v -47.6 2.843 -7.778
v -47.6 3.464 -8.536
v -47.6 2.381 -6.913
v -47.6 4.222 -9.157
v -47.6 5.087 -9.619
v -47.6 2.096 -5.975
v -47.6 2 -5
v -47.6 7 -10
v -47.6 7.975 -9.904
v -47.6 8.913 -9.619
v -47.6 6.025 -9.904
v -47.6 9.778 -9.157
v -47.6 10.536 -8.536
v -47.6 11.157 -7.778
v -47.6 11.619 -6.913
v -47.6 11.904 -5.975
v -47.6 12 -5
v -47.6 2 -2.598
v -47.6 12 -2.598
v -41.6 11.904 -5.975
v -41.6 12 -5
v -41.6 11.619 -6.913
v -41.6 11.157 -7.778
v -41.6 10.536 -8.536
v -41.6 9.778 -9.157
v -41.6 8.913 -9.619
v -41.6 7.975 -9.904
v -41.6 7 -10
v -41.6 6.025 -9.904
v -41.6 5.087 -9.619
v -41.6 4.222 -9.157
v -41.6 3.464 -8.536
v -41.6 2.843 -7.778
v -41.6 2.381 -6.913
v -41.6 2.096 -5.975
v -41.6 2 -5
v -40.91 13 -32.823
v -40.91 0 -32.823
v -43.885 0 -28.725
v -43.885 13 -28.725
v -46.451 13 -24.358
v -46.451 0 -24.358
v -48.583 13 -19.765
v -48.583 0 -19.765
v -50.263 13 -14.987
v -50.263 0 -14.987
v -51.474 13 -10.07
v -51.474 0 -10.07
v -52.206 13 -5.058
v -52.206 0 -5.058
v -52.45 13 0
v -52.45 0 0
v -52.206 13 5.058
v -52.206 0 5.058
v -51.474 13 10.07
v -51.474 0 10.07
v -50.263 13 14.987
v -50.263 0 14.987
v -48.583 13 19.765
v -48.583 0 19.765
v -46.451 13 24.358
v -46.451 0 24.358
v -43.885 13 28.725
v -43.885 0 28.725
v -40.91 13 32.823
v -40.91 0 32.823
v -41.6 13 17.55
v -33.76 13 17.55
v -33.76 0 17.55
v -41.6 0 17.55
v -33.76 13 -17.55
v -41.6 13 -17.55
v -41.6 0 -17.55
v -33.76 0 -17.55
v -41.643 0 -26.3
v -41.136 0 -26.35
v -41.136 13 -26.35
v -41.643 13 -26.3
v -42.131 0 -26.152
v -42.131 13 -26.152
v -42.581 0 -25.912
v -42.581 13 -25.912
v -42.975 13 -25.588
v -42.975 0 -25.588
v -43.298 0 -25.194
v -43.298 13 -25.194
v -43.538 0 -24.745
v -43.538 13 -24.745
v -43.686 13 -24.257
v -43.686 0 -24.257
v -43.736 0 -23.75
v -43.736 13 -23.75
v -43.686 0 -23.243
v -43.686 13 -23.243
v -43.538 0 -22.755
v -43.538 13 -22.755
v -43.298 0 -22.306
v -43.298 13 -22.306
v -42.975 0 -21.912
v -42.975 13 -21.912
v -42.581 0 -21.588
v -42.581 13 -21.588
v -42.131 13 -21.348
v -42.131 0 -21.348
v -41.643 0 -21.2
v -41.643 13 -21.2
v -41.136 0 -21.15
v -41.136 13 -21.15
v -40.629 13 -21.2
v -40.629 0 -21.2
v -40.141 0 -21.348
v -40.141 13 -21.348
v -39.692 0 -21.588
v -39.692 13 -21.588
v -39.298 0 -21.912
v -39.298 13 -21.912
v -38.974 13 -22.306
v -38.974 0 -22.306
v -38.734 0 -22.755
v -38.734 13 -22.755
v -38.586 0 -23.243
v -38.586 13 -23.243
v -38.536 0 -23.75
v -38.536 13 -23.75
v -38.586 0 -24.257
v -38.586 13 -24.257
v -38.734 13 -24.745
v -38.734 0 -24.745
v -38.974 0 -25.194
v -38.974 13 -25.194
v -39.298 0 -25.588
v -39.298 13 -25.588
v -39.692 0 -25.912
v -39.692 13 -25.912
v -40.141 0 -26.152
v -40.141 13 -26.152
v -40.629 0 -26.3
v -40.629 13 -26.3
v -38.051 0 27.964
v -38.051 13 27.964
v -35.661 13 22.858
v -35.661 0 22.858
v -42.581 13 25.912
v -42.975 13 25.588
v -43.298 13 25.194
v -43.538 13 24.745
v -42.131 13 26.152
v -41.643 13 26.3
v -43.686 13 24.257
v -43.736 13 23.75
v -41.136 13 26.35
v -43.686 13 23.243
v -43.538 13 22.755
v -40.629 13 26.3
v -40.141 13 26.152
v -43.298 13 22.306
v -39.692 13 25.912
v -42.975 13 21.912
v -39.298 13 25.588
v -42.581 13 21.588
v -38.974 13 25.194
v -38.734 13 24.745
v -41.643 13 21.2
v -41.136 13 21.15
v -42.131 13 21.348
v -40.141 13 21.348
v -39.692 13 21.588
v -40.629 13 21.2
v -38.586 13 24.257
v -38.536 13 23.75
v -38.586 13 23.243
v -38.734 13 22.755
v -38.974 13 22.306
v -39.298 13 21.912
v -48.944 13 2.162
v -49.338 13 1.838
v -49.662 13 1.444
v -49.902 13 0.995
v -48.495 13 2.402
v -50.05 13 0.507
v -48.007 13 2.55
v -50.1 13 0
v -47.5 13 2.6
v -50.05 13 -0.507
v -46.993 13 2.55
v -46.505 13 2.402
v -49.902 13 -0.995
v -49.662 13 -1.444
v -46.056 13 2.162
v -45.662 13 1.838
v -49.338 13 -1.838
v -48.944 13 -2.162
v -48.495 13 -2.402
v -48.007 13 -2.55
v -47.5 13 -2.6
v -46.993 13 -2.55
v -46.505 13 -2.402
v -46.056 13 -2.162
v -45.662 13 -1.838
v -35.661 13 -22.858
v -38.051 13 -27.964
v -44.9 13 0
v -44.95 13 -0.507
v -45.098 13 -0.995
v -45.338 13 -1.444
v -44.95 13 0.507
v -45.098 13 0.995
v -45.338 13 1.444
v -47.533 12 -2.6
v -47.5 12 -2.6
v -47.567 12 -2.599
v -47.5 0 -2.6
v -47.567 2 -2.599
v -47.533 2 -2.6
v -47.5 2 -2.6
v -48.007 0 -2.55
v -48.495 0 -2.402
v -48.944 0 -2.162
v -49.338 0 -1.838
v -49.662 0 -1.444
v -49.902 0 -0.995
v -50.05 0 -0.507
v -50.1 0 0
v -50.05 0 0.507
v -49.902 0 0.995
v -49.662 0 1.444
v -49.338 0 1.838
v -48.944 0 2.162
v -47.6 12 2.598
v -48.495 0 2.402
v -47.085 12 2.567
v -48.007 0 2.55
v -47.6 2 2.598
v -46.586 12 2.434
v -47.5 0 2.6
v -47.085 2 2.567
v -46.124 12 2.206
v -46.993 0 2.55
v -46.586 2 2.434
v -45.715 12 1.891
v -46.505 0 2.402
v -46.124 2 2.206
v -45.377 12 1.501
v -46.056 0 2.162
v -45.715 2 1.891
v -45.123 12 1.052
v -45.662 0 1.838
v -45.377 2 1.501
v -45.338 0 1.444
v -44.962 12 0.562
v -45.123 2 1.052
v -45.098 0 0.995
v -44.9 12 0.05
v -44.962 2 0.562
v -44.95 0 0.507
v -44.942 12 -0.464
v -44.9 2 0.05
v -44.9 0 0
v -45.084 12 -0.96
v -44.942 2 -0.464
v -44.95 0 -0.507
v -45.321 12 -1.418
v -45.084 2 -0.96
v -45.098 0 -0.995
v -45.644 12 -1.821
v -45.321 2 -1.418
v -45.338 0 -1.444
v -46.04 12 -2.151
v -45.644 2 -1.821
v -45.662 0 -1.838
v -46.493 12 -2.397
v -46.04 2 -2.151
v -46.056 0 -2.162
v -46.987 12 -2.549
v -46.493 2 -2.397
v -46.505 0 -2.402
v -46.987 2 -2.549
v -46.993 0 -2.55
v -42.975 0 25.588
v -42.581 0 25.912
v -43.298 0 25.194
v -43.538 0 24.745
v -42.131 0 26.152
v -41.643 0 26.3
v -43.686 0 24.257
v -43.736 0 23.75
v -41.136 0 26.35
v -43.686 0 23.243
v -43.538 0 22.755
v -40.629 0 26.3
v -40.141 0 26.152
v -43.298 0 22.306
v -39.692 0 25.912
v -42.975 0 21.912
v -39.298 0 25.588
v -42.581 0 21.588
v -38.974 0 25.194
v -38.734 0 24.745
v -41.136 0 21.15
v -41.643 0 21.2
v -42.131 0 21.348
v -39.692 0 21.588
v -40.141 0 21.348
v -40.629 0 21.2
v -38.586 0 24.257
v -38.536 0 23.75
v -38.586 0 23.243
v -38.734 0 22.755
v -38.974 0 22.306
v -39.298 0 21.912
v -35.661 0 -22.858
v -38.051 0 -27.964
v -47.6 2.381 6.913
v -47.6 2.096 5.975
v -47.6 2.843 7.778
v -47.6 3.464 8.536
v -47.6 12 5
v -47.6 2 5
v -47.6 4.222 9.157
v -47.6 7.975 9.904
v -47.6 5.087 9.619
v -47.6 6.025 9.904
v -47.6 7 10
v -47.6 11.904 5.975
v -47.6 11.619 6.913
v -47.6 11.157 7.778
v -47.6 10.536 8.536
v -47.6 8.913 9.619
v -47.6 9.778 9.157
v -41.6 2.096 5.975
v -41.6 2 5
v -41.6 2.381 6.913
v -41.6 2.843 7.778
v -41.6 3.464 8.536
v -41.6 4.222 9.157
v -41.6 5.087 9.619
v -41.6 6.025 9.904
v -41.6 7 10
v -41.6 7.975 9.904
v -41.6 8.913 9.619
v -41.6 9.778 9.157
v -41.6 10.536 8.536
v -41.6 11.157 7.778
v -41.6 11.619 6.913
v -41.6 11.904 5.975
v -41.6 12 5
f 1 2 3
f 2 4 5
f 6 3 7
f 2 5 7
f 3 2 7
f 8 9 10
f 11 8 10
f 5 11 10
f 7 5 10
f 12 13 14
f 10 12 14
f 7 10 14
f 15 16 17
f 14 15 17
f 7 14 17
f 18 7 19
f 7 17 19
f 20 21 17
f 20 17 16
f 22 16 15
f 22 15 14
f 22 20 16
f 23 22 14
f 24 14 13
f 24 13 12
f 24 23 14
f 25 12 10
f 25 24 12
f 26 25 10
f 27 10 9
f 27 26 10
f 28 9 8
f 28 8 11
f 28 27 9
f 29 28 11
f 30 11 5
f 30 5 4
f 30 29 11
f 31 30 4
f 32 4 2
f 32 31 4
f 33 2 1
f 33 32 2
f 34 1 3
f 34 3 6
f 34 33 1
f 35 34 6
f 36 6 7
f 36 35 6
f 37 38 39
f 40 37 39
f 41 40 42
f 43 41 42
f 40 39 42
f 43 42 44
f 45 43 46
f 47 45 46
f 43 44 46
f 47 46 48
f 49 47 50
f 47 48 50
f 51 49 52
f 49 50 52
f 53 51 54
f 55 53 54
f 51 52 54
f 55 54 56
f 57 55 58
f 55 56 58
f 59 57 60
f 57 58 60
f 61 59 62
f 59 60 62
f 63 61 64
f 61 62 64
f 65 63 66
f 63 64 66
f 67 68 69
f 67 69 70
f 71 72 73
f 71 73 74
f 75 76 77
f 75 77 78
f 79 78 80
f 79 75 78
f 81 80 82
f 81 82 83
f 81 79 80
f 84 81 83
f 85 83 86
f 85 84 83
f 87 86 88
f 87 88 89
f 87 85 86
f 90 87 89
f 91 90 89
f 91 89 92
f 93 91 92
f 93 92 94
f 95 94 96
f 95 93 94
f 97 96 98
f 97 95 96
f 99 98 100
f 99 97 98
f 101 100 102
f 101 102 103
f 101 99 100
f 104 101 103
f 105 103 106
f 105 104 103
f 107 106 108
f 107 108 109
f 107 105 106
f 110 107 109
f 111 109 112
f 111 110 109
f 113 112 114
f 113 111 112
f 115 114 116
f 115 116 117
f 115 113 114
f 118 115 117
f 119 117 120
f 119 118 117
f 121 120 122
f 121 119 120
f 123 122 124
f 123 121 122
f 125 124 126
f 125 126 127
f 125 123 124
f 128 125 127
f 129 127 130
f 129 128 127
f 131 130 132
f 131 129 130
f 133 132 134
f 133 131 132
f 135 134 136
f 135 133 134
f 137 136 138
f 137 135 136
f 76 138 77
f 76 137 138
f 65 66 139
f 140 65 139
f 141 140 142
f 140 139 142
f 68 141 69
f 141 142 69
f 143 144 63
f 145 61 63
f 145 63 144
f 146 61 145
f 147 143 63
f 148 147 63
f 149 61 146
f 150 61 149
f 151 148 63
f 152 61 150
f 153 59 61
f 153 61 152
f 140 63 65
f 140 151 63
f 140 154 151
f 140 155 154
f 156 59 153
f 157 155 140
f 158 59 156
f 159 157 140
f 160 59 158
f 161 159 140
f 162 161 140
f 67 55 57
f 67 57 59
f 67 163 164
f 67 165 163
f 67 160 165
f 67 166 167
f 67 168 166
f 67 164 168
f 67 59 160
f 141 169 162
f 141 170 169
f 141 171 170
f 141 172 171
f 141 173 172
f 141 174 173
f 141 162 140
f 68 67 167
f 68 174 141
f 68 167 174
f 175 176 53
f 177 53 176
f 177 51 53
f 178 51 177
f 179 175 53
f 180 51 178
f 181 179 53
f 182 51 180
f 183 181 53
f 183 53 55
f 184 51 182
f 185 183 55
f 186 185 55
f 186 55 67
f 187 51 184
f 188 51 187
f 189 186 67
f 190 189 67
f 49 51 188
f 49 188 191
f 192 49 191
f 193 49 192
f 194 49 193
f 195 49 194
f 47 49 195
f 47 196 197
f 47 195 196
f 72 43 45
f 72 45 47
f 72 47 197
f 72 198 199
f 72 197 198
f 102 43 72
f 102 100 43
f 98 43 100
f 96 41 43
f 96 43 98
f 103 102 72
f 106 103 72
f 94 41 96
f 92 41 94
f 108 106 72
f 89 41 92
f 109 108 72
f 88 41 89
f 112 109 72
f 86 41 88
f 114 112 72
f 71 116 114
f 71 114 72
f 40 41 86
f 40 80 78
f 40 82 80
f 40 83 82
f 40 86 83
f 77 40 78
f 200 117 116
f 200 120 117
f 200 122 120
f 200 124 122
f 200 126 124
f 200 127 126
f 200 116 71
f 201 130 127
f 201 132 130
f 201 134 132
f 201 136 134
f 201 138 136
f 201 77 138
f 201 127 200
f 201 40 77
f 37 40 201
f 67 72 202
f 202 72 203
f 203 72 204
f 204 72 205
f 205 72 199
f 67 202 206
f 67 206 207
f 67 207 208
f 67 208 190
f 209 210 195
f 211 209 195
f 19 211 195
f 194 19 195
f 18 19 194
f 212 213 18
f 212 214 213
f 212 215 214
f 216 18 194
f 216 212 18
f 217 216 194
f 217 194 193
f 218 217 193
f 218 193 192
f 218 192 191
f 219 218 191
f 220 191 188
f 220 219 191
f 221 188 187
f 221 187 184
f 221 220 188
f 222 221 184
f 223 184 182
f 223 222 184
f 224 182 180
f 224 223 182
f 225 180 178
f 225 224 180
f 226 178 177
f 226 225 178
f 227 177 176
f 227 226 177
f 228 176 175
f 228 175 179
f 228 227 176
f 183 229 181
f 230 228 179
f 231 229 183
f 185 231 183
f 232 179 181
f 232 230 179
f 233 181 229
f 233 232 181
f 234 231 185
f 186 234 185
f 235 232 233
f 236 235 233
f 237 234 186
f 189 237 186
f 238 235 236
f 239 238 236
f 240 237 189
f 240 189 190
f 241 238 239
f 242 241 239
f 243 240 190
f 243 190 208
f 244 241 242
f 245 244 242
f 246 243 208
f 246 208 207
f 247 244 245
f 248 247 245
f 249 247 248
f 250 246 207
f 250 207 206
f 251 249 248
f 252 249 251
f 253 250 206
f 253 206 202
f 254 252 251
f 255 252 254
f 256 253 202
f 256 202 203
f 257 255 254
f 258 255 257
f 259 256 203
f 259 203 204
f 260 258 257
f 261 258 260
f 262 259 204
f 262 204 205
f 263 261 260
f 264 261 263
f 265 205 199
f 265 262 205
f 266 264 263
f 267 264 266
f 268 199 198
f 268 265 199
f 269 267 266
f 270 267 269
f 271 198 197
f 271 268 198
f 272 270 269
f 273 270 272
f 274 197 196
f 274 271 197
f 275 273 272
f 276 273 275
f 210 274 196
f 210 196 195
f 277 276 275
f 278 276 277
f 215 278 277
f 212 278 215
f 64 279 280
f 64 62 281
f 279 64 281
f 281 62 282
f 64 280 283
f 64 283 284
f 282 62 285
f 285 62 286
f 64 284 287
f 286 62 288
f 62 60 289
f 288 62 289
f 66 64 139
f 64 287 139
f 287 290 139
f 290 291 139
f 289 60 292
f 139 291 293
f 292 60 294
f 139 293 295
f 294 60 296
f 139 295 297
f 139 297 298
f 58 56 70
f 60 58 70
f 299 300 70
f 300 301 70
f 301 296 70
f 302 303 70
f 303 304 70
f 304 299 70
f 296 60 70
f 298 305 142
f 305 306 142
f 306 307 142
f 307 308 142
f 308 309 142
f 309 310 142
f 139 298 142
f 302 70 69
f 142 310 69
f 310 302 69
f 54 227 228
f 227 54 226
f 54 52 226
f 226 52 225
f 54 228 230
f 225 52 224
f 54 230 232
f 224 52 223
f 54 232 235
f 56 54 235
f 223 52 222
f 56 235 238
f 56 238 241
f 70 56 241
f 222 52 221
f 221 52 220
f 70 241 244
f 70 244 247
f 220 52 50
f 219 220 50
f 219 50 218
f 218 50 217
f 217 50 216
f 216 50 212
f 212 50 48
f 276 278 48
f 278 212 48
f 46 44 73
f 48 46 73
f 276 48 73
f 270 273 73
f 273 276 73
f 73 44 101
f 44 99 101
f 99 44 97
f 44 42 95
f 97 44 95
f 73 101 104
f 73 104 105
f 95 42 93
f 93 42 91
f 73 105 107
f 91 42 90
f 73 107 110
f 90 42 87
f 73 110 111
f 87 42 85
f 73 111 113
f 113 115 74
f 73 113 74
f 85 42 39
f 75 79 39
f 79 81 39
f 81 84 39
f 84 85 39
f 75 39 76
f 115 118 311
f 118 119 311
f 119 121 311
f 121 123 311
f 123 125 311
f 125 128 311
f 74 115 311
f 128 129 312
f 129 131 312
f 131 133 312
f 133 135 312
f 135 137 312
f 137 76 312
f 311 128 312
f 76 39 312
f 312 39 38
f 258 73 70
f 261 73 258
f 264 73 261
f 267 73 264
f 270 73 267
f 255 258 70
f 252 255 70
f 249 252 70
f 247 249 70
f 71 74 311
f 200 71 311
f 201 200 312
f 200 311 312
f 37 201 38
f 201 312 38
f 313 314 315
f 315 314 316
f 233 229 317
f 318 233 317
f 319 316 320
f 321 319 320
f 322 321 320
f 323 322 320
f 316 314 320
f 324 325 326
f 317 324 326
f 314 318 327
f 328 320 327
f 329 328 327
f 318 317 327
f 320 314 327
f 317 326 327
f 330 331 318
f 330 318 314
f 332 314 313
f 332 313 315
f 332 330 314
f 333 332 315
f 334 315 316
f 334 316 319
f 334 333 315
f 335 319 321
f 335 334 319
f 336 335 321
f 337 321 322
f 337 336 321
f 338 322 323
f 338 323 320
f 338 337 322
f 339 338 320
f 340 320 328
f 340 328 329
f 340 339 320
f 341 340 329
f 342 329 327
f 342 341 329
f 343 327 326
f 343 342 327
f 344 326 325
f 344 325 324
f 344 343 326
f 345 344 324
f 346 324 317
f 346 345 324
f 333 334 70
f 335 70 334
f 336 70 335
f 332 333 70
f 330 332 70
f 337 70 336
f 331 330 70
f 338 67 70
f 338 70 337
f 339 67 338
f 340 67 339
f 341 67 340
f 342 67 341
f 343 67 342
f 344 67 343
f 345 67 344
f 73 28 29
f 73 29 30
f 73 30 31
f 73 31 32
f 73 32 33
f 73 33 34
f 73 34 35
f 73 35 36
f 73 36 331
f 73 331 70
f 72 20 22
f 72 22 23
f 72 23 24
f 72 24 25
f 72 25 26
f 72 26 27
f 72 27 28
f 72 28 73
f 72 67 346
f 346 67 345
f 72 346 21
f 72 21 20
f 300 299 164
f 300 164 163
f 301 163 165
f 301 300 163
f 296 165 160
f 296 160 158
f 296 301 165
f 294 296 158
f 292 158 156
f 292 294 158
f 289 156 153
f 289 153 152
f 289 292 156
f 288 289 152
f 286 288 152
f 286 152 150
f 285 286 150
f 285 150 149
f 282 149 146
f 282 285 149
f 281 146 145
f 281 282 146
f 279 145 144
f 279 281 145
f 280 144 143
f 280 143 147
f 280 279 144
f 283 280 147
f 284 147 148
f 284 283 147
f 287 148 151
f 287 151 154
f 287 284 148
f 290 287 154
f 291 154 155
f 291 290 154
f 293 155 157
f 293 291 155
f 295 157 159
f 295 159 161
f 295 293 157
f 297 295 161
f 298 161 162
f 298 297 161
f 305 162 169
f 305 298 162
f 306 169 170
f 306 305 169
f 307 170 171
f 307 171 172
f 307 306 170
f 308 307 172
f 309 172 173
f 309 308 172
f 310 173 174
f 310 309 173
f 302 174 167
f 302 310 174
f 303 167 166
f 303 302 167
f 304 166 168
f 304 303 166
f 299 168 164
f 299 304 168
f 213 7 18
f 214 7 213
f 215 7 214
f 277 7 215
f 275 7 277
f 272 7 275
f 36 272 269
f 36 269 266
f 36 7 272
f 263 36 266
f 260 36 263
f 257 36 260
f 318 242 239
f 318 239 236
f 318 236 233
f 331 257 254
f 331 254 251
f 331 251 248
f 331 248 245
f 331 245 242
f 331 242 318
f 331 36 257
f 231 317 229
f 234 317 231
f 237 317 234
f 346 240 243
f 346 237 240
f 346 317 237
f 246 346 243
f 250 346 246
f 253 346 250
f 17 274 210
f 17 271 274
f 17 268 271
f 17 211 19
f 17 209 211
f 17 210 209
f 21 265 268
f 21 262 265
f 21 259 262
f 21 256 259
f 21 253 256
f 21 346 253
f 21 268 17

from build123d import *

# Parameters (mm, degrees)
SKETCH_1_R          = 2.6
EXTRUDE_1_DEPTH     = 13
SKETCH_2_W          = 0.6
SKETCH_2_H          = 35.1
CUT_EXTRUDE_1_DEPTH = 23
CUT_EXTRUDE_2_DEPTH = 6


with BuildPart() as part:
    # 草图1 → 凸台-拉伸1 (new body)
    with BuildSketch(Plane(origin=(0, 0, 0), x_dir=(1, 0, 0), z_dir=(0, 1, 0))):
        with BuildLine():
            Line((-33.760275315, -17.55), (-41, -17.55))
            Line((-41, -17.55), (-41, 17.55))
            Line((-41, 17.55), (-33.760275315, 17.55))
            ThreePointArc((-33.760275315, 17.55), (-36.796000438, 25.438985546), (-40.910253672, 32.823065739))
            ThreePointArc((-40.910253672, 32.823065739), (-52.45, 0), (-40.910253672, -32.823065739))
            ThreePointArc((-40.910253672, -32.823065739), (-36.796000438, -25.438985546), (-33.760275315, -17.55))
        make_face()
        with Locations(Location((-41.13620668, -23.75, 0), (0, 0, 90))):
            Circle(SKETCH_1_R, mode=Mode.SUBTRACT)
        with Locations(Location((-41.13620668, 23.75, 0), (0, 0, 90))):
            Circle(SKETCH_1_R, mode=Mode.SUBTRACT)
        with Locations(Location((-47.5, 0, 0), (0, 0, 90))):
            Circle(SKETCH_1_R, mode=Mode.SUBTRACT)
    extrude(amount=EXTRUDE_1_DEPTH)

    # 草图2 → 切除-拉伸1 (cut)
    with BuildSketch(Plane(origin=(0, 13, 0), x_dir=(1, 0, 0), z_dir=(0, 1, 0))):
        with Locations((-41.3, 0)):
            Rectangle(SKETCH_2_W, SKETCH_2_H)
    extrude(amount=-CUT_EXTRUDE_1_DEPTH, mode=Mode.SUBTRACT)

    # 草图3 → 切除-拉伸2 (cut)
    with BuildSketch(Plane(origin=(-41.6, 0, 0), x_dir=(0, 0, -1), z_dir=(1, 0, 0))):
        with BuildLine():
            Line((-5, 12), (5, 12))
            ThreePointArc((5, 12), (10, 7), (5, 2))
            Line((5, 2), (-5, 2))
            ThreePointArc((-5, 2), (-10, 7), (-5, 12))
        make_face()
    extrude(amount=-CUT_EXTRUDE_2_DEPTH, mode=Mode.SUBTRACT)


solid = part.part
